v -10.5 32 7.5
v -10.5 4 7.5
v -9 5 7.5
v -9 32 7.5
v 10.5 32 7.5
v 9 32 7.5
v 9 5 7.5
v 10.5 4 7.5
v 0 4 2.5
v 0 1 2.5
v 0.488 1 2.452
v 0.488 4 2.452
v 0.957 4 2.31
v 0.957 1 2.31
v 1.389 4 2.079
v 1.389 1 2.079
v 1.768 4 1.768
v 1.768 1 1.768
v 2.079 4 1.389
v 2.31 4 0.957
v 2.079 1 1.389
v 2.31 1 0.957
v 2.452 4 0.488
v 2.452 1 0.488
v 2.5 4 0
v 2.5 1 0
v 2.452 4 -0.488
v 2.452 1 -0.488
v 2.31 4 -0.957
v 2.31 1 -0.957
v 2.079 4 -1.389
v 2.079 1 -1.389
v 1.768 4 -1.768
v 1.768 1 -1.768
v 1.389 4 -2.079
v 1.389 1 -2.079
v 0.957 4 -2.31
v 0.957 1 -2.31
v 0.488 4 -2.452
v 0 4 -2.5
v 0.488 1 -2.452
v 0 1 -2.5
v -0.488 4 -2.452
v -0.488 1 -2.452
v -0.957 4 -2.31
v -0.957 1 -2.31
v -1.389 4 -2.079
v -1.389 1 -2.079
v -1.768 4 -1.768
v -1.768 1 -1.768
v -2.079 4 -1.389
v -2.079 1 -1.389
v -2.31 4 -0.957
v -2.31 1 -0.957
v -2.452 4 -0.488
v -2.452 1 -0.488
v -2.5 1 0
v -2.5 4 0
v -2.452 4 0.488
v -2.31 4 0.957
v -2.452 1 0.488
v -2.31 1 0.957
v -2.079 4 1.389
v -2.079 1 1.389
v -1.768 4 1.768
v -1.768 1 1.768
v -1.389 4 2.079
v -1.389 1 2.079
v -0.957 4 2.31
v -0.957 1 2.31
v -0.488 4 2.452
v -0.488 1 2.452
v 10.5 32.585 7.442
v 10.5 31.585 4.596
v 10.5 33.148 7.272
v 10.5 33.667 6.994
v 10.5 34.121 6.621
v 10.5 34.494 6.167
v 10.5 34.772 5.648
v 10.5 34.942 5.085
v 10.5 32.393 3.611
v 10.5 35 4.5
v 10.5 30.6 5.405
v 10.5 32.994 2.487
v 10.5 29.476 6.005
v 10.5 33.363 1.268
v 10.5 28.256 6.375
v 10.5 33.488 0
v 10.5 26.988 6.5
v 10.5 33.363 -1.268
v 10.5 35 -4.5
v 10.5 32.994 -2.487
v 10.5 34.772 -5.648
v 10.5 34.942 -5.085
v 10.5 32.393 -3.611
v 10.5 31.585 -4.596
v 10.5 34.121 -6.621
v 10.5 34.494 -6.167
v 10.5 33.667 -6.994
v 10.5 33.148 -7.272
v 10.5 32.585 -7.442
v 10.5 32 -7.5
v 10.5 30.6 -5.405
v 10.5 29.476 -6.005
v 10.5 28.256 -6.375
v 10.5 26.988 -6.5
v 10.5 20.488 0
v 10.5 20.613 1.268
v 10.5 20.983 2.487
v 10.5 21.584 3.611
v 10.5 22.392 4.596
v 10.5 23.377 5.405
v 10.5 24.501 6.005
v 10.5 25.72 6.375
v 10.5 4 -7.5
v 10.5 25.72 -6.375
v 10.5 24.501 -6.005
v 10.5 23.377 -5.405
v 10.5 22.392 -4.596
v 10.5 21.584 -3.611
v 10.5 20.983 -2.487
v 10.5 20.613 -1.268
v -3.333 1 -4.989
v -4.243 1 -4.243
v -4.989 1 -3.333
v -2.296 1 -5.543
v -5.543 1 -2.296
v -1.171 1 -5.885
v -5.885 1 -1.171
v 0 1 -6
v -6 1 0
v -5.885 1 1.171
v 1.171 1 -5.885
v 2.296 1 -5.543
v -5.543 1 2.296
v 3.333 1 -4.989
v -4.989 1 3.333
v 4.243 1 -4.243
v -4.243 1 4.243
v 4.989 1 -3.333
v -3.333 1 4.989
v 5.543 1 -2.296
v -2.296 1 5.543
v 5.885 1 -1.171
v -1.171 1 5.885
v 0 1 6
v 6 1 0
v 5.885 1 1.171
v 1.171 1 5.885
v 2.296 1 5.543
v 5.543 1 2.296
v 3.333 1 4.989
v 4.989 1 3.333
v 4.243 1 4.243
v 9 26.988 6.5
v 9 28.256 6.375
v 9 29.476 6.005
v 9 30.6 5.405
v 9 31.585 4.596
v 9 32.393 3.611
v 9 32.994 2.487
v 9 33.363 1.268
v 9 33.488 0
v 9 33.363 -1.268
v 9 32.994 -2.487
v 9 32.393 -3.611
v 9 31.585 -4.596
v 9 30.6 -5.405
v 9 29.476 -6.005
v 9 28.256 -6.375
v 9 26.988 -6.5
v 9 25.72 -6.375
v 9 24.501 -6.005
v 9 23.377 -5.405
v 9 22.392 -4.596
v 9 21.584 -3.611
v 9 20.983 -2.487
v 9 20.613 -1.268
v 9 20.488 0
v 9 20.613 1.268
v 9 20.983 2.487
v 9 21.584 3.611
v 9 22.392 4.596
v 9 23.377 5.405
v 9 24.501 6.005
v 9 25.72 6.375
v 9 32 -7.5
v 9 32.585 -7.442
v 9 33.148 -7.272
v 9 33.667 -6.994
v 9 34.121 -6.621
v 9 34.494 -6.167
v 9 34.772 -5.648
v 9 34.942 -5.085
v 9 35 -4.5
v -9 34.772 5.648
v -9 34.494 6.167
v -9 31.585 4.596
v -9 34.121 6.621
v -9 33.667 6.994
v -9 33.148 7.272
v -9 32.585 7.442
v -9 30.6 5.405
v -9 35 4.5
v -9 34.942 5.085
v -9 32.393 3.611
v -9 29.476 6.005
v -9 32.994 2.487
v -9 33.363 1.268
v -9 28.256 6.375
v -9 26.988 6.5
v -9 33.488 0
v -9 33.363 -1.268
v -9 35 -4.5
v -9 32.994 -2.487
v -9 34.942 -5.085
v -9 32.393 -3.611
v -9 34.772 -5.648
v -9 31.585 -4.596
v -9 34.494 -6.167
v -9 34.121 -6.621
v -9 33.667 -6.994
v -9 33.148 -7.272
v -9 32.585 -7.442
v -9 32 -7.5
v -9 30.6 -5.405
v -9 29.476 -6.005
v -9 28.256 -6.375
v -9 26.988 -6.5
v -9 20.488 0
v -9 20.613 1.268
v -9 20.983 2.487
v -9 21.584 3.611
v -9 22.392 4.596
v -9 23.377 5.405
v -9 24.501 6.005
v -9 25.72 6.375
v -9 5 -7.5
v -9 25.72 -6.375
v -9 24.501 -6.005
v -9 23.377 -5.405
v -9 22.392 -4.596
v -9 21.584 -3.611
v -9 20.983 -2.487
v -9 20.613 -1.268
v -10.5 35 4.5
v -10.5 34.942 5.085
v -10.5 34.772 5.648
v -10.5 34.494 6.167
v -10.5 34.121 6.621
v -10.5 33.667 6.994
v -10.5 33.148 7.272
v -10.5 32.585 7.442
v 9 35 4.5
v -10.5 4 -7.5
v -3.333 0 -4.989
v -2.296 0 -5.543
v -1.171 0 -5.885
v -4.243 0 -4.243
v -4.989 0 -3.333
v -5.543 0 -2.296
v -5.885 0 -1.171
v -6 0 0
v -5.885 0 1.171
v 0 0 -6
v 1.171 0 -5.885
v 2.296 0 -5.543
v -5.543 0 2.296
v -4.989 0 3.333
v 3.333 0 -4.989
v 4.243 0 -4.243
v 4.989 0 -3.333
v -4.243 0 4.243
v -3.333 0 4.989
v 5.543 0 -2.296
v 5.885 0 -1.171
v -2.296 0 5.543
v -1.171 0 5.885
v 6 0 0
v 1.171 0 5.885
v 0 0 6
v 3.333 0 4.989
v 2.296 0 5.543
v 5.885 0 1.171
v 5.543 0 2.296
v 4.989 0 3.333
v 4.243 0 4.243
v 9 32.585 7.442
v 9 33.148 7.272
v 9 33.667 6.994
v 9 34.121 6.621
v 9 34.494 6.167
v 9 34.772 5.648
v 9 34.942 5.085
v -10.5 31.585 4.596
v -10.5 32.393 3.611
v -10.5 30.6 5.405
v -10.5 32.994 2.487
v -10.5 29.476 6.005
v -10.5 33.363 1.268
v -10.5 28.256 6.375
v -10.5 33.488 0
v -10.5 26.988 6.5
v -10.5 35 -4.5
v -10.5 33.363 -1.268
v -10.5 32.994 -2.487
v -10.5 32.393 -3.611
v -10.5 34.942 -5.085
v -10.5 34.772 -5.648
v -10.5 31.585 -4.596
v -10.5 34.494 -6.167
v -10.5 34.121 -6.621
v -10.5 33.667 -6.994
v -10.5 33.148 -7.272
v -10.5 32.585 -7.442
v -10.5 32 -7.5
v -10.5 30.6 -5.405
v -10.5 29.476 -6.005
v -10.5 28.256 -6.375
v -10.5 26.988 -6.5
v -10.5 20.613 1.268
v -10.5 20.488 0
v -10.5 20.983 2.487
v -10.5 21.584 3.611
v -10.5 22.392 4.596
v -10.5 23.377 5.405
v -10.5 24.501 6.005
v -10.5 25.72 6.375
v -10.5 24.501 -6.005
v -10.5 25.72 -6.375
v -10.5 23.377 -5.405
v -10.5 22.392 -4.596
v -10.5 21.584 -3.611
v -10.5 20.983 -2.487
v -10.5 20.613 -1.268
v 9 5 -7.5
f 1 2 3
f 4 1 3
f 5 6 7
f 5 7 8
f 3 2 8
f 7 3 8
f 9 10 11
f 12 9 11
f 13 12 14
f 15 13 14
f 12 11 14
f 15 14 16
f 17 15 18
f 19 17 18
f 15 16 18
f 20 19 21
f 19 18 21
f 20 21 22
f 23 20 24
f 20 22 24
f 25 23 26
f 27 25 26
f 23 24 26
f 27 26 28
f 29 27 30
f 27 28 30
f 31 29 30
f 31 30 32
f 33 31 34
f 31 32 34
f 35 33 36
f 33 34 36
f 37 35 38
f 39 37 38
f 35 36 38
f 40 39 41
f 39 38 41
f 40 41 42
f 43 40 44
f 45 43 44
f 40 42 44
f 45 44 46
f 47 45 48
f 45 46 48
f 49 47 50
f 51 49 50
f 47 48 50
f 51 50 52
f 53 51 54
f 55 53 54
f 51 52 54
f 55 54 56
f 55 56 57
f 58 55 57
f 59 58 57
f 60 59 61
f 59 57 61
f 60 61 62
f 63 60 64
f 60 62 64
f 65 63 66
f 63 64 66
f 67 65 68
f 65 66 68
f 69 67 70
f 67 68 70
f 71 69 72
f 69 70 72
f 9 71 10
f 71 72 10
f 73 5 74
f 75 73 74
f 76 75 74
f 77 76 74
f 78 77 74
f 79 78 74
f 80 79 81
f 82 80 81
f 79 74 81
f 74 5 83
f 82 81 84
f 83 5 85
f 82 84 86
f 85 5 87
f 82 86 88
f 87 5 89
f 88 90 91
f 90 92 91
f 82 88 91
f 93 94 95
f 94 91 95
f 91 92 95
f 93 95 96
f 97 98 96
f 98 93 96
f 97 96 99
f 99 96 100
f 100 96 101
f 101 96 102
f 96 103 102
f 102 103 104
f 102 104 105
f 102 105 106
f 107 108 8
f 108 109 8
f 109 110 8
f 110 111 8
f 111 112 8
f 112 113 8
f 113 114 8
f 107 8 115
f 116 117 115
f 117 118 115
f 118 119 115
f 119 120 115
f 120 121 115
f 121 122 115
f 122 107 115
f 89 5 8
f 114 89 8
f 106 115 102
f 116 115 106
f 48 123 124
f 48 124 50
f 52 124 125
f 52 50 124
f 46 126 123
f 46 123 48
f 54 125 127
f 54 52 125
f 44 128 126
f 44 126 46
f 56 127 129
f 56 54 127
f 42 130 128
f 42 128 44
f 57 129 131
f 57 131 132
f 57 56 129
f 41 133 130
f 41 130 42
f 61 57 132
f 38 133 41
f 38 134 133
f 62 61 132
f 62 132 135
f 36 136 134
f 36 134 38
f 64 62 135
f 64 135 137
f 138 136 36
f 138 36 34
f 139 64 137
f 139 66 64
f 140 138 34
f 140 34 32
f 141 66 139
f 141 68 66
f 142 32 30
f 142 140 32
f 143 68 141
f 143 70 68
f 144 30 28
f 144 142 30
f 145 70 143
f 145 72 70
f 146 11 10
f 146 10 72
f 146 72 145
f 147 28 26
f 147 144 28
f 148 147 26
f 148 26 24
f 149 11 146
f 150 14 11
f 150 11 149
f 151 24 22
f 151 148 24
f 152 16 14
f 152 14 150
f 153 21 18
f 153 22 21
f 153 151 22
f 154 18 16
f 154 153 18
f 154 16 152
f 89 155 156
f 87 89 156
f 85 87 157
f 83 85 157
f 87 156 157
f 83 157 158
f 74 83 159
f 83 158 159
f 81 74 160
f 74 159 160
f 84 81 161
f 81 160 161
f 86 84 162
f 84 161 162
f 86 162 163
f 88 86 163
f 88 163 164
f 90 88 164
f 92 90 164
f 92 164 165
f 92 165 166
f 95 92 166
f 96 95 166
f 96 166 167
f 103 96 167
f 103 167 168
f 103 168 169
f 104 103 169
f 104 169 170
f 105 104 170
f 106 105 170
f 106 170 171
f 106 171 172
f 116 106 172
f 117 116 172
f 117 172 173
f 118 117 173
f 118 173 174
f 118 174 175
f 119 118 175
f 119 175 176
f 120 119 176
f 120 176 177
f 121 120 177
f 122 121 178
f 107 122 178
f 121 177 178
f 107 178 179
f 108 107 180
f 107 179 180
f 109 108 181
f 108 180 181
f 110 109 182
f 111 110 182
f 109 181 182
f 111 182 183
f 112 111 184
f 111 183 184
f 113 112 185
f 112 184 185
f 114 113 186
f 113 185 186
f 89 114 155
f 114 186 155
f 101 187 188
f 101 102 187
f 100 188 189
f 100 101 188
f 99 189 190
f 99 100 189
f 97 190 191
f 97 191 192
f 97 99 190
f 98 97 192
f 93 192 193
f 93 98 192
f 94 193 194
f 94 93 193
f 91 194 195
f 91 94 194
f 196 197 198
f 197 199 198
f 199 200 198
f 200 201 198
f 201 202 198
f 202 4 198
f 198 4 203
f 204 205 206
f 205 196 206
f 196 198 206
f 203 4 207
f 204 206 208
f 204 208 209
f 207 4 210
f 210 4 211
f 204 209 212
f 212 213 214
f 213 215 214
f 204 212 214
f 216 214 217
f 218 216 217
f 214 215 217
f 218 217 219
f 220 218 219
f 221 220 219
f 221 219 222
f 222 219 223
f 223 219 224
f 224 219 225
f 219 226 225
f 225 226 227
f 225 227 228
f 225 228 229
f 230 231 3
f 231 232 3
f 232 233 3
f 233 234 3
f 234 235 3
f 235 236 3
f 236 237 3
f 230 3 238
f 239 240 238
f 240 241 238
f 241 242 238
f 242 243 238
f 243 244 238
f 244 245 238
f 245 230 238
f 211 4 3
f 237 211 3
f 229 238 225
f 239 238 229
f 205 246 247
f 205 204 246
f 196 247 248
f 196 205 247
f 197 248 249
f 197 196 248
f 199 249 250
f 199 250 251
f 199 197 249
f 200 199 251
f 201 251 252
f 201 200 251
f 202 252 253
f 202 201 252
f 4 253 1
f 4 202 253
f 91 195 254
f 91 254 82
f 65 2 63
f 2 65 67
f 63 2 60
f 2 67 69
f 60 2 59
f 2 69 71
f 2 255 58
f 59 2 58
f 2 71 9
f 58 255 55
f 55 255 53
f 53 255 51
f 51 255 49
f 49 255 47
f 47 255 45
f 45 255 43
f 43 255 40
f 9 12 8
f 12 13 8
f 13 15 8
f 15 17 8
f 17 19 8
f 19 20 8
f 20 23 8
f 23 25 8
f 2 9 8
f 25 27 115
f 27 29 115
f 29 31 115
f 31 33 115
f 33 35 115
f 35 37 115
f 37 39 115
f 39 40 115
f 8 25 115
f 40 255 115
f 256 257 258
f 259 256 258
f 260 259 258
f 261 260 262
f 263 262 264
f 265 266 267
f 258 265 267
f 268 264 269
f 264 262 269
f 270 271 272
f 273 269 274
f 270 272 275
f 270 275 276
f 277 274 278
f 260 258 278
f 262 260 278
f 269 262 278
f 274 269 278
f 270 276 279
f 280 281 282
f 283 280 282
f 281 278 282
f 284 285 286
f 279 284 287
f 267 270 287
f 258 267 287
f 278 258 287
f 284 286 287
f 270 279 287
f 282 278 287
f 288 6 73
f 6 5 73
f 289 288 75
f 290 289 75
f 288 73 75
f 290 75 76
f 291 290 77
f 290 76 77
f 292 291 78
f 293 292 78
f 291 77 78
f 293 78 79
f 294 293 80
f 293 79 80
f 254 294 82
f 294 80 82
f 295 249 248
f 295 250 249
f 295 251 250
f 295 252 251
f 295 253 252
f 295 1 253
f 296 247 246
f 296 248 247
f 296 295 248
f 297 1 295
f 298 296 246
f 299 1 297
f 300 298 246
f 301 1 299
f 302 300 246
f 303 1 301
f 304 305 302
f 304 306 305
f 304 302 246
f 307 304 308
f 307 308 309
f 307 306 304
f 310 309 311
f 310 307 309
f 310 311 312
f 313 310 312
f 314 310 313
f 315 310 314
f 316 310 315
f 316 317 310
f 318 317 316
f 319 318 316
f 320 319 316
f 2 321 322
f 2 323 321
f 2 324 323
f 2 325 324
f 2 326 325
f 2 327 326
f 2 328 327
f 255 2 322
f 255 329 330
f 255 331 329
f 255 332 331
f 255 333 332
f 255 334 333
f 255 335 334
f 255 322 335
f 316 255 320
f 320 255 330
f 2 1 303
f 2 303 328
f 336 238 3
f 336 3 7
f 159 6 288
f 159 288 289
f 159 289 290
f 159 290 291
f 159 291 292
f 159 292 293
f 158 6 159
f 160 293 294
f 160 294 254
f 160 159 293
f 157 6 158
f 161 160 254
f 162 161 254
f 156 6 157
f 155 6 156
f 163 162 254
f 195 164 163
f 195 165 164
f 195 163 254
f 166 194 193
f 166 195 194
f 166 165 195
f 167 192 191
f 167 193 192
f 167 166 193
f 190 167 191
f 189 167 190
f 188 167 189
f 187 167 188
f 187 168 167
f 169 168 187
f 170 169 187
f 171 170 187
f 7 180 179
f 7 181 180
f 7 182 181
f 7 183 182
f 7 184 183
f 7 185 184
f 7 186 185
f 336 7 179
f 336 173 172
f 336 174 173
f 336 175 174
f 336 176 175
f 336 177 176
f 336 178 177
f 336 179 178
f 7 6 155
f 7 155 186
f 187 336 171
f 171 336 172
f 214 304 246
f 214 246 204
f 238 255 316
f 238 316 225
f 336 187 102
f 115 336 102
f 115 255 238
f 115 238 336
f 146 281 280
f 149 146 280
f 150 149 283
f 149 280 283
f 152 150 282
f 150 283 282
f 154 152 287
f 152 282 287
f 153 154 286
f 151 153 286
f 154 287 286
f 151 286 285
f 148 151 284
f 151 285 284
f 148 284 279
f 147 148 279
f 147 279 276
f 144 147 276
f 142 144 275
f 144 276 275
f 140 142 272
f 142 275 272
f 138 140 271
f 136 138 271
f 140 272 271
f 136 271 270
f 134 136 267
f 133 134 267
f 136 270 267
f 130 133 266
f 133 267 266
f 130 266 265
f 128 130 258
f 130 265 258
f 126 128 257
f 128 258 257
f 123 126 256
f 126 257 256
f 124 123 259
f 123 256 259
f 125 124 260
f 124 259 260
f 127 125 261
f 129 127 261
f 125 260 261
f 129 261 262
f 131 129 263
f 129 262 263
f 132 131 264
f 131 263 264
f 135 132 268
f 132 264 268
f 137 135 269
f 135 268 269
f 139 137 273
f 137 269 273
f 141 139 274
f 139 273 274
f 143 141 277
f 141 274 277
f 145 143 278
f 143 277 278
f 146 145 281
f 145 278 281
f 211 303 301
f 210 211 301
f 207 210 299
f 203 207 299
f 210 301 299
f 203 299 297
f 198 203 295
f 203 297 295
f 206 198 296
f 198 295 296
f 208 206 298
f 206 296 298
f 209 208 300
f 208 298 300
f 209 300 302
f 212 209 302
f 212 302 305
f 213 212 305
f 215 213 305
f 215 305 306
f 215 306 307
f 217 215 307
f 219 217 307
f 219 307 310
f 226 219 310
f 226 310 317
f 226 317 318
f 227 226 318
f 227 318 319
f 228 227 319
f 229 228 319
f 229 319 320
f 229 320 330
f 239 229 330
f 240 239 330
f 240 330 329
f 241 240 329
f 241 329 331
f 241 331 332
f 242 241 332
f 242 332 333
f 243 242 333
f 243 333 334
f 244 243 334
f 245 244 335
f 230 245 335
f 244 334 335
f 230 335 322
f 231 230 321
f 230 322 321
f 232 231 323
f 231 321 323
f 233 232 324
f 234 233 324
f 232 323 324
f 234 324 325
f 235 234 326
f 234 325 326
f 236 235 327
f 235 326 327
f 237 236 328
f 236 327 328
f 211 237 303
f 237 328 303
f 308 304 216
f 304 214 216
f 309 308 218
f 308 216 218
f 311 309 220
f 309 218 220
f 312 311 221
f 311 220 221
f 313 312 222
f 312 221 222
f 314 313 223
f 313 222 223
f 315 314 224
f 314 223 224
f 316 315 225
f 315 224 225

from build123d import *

# Parameters (mm, degrees)
CROQUIS1_R              = 6
SALIENTE_EXTRUIR1_DEPTH = 1
CROQUIS2_R              = 2.5
SALIENTE_EXTRUIR2_DEPTH = 3
CROQUIS3_W              = 21
CROQUIS3_H              = 15
SALIENTE_EXTRUIR3_DEPTH = 1
CROQUIS4_W              = 1.5
CROQUIS4_H              = 15
SALIENTE_EXTRUIR4_DEPTH = 30
CROQUIS5_R              = 6.5
CORTAR_EXTRUIR1_DEPTH   = 34
REDONDEO1_R             = 3


with BuildPart() as part:
    # Croquis1 → Saliente-Extruir1 (new body)
    with BuildSketch(Plane(origin=(0, 0, 0), x_dir=(1, 0, 0), z_dir=(0, 1, 0))):
        with Locations(Location((0, 0, 0), (0, 0, 270))):
            Circle(CROQUIS1_R)
    extrude(amount=SALIENTE_EXTRUIR1_DEPTH)

    # Croquis2 → Saliente-Extruir2 (add)
    with BuildSketch(Plane(origin=(0, 1, 0), x_dir=(1, 0, 0), z_dir=(0, 1, 0))):
        with Locations(Location((0, 0, 0), (0, 0, 270))):
            Circle(CROQUIS2_R)
    extrude(amount=SALIENTE_EXTRUIR2_DEPTH)

    # Croquis3 → Saliente-Extruir3 (add)
    with BuildSketch(Plane(origin=(0, 4, 0), x_dir=(1, 0, 0), z_dir=(0, 1, 0))):
        Rectangle(CROQUIS3_W, CROQUIS3_H)
    extrude(amount=SALIENTE_EXTRUIR3_DEPTH)

    # Croquis4 → Saliente-Extruir4 (add)
    with BuildSketch(Plane(origin=(0, 5, 0), x_dir=(1, 0, 0), z_dir=(0, 1, 0))):
        with Locations((-9.75, 0)):
            Rectangle(CROQUIS4_W, CROQUIS4_H)
        with Locations((9.75, 0)):
            Rectangle(CROQUIS4_W, CROQUIS4_H)
    extrude(amount=SALIENTE_EXTRUIR4_DEPTH)

    # Croquis5 → Cortar-Extruir1 (cut)
    with BuildSketch(Plane.ZY.offset(10.5)):
        with Locations((0, 26.988393785)):
            Circle(CROQUIS5_R)
    extrude(amount=-CORTAR_EXTRUIR1_DEPTH, mode=Mode.SUBTRACT)

    # Redondeo1
    redondeo1_edges = [part.edges().sort_by_distance(p)[0] for p in [
        (-9.75, 35, 7.5),
        (-9.75, 35, -7.5),
        (9.75, 35, -7.5),
        (9.75, 35, 7.5),
    ]]
    fillet(redondeo1_edges, radius=REDONDEO1_R)


solid = part.part
